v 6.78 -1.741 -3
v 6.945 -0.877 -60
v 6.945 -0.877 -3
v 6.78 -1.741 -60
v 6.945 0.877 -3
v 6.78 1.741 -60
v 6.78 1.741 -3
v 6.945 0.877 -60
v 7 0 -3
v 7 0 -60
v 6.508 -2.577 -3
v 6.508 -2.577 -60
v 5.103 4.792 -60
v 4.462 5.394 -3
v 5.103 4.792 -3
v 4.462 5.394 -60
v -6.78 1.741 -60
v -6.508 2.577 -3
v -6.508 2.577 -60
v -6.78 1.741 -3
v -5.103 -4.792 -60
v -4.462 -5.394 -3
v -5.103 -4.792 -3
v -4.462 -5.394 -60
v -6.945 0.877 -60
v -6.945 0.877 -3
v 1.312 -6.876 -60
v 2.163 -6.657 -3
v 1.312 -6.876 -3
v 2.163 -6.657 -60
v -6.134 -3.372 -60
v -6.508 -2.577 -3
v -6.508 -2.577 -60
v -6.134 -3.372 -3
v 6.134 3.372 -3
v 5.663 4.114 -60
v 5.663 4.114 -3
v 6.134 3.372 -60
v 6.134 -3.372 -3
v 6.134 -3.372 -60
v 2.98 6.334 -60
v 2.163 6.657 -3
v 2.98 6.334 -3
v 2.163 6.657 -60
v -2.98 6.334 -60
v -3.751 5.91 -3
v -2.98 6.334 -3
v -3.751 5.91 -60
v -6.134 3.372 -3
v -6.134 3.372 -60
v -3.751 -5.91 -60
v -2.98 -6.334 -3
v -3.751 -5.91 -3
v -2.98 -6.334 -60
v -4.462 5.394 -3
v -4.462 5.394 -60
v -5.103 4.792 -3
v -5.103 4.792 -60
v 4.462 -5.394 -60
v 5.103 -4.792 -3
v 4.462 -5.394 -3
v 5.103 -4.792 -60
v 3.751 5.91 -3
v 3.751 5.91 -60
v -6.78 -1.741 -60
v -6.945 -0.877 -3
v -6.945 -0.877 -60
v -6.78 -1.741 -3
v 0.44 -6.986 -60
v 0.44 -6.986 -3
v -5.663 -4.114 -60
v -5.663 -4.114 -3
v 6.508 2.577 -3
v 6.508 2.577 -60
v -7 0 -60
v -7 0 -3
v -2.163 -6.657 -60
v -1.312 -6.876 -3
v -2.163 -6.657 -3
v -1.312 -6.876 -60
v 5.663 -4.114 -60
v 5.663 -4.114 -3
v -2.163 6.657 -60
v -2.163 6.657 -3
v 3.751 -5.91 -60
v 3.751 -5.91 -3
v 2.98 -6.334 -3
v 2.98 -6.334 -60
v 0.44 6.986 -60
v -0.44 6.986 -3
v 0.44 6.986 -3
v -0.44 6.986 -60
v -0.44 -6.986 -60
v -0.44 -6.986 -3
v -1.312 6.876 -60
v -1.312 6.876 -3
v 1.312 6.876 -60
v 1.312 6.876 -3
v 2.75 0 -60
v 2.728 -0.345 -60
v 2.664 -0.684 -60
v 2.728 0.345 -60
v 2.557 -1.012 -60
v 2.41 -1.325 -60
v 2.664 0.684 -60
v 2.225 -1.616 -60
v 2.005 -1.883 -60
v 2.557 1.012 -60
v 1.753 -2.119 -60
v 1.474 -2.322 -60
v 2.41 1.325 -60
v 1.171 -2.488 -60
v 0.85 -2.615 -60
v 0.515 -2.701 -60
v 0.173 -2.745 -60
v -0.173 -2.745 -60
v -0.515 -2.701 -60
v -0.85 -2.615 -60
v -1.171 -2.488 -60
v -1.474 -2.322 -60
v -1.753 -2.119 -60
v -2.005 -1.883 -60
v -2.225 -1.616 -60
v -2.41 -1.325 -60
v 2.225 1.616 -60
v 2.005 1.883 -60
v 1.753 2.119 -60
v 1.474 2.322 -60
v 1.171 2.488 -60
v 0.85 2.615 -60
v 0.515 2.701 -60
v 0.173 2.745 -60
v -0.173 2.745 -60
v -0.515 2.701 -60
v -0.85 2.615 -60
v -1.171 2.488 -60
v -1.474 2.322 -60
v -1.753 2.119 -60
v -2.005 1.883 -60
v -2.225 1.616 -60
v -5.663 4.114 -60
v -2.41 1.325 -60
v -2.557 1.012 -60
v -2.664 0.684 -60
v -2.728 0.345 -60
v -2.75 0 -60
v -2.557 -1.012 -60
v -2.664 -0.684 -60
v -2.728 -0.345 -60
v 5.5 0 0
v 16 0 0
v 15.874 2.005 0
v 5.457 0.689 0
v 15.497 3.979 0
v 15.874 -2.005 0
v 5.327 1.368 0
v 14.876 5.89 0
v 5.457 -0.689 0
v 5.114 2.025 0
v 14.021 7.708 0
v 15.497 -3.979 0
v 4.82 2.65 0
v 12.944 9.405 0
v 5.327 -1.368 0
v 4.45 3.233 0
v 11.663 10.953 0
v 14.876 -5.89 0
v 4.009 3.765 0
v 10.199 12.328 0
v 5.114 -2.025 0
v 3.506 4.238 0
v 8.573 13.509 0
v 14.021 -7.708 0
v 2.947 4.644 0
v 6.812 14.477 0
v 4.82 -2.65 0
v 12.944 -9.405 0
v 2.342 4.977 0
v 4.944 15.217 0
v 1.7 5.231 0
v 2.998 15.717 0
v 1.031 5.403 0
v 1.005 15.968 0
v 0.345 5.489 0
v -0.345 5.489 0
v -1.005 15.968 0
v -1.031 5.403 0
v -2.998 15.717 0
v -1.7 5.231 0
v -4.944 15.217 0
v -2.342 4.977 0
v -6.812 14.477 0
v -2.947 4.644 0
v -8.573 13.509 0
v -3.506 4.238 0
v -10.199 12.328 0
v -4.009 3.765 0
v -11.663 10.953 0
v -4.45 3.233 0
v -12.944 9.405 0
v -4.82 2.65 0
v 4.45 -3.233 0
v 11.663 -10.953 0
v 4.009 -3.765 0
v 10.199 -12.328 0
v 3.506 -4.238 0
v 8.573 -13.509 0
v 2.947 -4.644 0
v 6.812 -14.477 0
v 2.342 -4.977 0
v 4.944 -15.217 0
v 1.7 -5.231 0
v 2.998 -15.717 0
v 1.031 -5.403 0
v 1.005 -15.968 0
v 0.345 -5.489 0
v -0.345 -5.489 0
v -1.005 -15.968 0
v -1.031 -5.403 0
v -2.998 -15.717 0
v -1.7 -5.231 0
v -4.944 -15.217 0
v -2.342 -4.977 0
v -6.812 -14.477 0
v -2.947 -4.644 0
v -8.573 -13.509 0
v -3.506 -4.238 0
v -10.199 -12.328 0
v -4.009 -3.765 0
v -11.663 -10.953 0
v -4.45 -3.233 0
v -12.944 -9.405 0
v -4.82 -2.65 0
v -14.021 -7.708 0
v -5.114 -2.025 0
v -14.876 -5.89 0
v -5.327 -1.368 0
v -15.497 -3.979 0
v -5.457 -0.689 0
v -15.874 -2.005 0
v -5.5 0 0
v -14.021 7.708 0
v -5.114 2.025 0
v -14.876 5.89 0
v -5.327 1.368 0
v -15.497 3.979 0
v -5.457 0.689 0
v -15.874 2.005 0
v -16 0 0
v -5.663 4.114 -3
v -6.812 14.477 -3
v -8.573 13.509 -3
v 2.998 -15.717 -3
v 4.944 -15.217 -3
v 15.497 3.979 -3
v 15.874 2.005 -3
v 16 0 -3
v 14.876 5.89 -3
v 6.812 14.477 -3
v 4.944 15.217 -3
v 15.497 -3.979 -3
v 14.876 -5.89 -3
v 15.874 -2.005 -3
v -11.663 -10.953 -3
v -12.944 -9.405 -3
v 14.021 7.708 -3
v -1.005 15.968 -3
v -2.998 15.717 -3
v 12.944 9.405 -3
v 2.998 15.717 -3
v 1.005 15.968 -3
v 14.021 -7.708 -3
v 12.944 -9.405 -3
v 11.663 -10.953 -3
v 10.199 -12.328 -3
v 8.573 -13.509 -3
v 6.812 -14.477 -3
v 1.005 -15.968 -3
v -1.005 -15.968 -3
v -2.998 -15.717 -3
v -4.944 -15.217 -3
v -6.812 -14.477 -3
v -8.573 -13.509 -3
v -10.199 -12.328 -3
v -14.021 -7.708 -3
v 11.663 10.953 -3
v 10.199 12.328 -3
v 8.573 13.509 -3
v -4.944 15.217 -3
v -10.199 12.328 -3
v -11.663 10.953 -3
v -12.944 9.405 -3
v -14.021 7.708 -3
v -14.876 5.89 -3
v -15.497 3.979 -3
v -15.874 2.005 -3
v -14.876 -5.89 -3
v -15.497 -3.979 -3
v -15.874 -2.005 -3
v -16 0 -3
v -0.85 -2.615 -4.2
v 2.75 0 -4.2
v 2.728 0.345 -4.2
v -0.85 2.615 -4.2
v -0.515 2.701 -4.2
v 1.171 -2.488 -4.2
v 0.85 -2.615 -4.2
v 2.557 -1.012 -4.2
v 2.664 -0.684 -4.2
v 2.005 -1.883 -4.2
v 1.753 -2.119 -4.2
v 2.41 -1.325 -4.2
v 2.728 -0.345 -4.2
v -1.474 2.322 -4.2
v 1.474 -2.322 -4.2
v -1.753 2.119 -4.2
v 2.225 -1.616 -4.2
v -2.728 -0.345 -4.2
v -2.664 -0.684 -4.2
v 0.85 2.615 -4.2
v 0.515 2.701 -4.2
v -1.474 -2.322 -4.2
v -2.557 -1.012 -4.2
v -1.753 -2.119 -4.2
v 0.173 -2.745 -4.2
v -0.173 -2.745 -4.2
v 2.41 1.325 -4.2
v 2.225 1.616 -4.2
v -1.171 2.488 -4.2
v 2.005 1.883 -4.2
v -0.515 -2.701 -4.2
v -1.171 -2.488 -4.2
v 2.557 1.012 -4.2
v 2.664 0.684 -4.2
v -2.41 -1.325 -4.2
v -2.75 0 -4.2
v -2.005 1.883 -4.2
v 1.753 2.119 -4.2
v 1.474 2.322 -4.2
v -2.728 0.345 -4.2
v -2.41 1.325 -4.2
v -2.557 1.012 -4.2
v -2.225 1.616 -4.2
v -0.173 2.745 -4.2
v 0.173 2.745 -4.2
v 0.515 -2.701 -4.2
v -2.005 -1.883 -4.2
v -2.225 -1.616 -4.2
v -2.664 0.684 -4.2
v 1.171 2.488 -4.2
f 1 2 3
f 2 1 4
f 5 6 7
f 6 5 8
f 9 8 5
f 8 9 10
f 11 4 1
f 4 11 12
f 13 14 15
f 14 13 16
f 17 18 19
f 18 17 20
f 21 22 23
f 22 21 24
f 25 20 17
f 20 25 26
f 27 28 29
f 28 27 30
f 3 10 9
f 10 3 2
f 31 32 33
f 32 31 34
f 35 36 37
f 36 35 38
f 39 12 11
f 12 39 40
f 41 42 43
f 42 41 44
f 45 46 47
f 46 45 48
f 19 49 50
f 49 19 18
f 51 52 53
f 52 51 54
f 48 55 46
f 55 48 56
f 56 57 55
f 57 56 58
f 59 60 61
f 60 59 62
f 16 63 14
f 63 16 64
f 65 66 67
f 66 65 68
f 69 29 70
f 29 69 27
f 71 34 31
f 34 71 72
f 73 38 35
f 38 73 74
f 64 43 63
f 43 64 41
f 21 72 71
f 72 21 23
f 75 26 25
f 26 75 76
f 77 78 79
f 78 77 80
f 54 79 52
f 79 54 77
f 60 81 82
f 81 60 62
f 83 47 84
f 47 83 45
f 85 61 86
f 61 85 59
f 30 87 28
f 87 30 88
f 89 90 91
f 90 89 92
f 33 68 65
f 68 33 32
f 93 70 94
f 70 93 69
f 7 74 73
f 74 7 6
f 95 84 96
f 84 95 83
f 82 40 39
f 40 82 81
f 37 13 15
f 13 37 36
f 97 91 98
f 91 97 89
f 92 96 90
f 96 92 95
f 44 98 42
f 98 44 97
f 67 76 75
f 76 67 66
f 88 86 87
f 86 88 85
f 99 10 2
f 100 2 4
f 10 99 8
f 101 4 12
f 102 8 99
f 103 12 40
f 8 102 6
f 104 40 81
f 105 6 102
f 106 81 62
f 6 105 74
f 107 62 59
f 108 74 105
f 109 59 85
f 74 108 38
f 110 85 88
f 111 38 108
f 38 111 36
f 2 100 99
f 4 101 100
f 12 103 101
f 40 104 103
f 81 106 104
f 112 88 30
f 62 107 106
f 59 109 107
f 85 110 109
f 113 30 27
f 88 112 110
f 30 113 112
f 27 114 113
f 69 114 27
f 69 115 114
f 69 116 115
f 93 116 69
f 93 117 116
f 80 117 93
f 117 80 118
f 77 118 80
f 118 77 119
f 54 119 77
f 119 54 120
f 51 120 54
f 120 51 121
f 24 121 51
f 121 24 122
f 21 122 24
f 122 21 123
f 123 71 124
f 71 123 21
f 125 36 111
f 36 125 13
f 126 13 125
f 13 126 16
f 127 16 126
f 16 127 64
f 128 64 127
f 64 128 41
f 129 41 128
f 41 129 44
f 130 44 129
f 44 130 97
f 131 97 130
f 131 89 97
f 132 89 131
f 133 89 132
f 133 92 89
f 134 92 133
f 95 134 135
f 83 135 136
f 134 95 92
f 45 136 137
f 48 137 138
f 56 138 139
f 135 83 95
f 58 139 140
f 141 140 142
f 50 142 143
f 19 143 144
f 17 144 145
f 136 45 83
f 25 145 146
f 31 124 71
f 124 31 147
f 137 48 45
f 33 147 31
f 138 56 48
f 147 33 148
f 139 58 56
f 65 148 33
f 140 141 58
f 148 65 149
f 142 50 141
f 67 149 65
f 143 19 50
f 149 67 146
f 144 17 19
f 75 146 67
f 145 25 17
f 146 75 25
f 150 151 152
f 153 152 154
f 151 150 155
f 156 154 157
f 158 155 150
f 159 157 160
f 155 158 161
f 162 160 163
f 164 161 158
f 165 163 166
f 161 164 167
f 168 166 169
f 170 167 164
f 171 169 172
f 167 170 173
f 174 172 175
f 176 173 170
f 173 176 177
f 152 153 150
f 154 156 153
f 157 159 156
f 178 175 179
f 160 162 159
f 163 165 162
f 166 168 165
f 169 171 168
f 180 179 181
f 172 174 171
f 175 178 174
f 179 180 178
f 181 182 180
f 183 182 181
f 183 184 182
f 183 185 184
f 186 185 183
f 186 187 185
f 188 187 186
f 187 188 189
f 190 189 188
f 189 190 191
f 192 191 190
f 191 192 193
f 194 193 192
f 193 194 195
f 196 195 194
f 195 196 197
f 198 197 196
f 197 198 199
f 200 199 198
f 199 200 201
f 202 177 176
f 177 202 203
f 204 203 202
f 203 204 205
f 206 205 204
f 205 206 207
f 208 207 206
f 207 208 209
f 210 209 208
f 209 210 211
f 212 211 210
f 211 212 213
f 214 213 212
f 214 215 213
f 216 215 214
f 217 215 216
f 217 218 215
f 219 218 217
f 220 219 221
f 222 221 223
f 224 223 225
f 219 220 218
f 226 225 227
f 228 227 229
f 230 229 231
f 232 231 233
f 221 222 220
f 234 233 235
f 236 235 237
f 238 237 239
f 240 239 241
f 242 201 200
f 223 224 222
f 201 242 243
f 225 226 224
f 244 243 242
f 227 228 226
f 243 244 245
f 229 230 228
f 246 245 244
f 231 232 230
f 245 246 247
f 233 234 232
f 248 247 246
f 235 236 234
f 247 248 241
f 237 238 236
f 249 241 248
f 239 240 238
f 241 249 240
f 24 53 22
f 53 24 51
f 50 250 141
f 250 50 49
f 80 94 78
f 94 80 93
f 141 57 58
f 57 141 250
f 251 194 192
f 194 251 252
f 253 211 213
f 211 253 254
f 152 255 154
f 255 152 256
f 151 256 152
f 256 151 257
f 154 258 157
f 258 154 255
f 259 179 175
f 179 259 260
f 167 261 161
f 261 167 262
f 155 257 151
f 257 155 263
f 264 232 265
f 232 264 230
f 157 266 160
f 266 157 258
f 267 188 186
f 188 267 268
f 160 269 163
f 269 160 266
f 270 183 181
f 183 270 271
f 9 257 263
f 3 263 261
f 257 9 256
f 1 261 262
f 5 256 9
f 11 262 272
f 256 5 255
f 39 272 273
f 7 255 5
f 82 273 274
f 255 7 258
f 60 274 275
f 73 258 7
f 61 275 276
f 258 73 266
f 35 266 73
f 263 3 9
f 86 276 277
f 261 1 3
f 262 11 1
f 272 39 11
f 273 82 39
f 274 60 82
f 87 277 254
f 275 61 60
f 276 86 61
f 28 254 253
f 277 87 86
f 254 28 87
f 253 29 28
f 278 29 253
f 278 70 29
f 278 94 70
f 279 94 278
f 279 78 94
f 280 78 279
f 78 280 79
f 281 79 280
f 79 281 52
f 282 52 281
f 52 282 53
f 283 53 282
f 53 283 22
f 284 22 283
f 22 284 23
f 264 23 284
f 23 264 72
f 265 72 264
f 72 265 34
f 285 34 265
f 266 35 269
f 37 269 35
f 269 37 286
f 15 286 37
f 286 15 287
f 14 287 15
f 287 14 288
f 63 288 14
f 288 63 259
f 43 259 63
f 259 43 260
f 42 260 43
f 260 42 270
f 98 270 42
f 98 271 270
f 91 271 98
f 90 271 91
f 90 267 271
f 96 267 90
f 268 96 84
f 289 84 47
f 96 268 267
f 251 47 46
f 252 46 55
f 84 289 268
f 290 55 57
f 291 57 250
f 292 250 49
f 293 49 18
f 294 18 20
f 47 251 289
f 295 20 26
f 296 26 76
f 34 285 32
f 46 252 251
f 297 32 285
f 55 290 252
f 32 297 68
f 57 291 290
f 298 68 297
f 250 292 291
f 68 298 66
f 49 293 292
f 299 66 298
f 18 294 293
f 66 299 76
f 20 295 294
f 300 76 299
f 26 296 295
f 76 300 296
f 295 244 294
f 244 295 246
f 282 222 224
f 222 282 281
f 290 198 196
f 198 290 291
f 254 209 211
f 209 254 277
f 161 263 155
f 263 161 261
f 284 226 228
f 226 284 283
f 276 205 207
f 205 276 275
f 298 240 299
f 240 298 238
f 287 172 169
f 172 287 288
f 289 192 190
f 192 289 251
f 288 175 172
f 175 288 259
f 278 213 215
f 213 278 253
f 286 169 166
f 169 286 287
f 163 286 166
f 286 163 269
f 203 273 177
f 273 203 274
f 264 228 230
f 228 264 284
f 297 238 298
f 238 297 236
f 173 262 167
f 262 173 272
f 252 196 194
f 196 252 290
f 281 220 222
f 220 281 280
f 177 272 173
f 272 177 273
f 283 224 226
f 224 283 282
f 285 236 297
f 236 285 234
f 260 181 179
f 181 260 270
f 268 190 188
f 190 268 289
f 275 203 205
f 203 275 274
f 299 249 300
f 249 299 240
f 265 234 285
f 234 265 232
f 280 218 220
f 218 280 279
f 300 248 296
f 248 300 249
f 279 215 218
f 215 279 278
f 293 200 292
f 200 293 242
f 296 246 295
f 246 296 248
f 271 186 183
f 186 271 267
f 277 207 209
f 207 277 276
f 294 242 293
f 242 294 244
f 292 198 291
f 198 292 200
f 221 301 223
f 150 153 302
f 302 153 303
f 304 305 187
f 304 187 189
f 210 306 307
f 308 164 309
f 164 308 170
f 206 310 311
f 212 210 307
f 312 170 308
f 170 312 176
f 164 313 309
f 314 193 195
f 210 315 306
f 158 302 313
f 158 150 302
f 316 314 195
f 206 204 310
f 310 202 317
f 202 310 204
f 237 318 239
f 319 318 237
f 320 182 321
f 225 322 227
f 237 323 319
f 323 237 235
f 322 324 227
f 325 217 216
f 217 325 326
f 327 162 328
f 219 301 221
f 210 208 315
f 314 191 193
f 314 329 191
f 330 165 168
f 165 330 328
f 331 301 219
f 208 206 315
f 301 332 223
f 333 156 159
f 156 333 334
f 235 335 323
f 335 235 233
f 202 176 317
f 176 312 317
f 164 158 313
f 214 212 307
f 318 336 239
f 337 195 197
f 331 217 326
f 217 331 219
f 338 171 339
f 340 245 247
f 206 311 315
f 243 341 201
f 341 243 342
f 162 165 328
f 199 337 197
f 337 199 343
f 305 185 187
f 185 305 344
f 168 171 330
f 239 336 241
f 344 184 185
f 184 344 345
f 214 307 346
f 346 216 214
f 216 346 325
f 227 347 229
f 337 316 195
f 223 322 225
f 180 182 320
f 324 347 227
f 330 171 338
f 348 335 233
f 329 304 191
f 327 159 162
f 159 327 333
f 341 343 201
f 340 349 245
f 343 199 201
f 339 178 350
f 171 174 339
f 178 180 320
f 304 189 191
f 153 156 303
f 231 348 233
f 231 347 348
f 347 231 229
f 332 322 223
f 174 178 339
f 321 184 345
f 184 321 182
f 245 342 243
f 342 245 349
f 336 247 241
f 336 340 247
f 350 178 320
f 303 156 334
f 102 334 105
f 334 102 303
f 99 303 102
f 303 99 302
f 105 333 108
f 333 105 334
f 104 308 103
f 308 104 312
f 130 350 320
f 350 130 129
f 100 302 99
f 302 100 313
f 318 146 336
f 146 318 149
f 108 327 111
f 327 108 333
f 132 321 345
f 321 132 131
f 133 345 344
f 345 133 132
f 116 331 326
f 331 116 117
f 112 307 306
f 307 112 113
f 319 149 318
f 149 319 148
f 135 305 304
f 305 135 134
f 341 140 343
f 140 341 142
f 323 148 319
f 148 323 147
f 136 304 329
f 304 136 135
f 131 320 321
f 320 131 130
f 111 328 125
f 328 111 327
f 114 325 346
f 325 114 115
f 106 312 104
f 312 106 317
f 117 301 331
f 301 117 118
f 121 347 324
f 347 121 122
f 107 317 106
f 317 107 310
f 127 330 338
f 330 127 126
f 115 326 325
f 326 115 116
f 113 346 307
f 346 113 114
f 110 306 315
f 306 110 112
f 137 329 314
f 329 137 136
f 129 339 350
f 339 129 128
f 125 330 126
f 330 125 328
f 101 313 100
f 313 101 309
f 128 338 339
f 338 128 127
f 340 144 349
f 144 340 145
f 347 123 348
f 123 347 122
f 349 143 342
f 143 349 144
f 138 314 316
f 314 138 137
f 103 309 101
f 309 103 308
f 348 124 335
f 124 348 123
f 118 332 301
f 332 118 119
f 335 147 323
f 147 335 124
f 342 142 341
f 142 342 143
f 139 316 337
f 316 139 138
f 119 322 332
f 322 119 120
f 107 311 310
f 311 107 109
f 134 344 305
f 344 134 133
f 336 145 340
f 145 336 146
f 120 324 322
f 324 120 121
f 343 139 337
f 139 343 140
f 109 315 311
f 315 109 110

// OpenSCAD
$fn = 50;


difference() {
	union() {
		translate(v = [0, 0, -60.0000000000]) {
			cylinder(h = 60, r = 7.0000000000);
		}
		translate(v = [0, 0, -3.0000000000]) {
			cylinder(h = 3, r = 16.0000000000);
		}
	}
	union() {
		translate(v = [0, 0, 0]) {
			rotate(a = [0, 0, 0]) {
				difference() {
					union() {
						#translate(v = [0, 0, -60.0000000000]) {
							cylinder(h = 60, r = 2.2500000000);
						}
						#translate(v = [0, 0, -4.2000000000]) {
							cylinder(h = 4.2000000000, r = 7.0000000000, r1 = 2.7500000000, r2 = 5.5000000000);
						}
						#translate(v = [0, 0, -60.0000000000]) {
							cylinder(h = 60, r = 2.7500000000);
						}
						#translate(v = [0, 0, -60.0000000000]) {
							cylinder(h = 60, r = 2.2500000000);
						}
					}
					union();
				}
			}
		}
	}
}
